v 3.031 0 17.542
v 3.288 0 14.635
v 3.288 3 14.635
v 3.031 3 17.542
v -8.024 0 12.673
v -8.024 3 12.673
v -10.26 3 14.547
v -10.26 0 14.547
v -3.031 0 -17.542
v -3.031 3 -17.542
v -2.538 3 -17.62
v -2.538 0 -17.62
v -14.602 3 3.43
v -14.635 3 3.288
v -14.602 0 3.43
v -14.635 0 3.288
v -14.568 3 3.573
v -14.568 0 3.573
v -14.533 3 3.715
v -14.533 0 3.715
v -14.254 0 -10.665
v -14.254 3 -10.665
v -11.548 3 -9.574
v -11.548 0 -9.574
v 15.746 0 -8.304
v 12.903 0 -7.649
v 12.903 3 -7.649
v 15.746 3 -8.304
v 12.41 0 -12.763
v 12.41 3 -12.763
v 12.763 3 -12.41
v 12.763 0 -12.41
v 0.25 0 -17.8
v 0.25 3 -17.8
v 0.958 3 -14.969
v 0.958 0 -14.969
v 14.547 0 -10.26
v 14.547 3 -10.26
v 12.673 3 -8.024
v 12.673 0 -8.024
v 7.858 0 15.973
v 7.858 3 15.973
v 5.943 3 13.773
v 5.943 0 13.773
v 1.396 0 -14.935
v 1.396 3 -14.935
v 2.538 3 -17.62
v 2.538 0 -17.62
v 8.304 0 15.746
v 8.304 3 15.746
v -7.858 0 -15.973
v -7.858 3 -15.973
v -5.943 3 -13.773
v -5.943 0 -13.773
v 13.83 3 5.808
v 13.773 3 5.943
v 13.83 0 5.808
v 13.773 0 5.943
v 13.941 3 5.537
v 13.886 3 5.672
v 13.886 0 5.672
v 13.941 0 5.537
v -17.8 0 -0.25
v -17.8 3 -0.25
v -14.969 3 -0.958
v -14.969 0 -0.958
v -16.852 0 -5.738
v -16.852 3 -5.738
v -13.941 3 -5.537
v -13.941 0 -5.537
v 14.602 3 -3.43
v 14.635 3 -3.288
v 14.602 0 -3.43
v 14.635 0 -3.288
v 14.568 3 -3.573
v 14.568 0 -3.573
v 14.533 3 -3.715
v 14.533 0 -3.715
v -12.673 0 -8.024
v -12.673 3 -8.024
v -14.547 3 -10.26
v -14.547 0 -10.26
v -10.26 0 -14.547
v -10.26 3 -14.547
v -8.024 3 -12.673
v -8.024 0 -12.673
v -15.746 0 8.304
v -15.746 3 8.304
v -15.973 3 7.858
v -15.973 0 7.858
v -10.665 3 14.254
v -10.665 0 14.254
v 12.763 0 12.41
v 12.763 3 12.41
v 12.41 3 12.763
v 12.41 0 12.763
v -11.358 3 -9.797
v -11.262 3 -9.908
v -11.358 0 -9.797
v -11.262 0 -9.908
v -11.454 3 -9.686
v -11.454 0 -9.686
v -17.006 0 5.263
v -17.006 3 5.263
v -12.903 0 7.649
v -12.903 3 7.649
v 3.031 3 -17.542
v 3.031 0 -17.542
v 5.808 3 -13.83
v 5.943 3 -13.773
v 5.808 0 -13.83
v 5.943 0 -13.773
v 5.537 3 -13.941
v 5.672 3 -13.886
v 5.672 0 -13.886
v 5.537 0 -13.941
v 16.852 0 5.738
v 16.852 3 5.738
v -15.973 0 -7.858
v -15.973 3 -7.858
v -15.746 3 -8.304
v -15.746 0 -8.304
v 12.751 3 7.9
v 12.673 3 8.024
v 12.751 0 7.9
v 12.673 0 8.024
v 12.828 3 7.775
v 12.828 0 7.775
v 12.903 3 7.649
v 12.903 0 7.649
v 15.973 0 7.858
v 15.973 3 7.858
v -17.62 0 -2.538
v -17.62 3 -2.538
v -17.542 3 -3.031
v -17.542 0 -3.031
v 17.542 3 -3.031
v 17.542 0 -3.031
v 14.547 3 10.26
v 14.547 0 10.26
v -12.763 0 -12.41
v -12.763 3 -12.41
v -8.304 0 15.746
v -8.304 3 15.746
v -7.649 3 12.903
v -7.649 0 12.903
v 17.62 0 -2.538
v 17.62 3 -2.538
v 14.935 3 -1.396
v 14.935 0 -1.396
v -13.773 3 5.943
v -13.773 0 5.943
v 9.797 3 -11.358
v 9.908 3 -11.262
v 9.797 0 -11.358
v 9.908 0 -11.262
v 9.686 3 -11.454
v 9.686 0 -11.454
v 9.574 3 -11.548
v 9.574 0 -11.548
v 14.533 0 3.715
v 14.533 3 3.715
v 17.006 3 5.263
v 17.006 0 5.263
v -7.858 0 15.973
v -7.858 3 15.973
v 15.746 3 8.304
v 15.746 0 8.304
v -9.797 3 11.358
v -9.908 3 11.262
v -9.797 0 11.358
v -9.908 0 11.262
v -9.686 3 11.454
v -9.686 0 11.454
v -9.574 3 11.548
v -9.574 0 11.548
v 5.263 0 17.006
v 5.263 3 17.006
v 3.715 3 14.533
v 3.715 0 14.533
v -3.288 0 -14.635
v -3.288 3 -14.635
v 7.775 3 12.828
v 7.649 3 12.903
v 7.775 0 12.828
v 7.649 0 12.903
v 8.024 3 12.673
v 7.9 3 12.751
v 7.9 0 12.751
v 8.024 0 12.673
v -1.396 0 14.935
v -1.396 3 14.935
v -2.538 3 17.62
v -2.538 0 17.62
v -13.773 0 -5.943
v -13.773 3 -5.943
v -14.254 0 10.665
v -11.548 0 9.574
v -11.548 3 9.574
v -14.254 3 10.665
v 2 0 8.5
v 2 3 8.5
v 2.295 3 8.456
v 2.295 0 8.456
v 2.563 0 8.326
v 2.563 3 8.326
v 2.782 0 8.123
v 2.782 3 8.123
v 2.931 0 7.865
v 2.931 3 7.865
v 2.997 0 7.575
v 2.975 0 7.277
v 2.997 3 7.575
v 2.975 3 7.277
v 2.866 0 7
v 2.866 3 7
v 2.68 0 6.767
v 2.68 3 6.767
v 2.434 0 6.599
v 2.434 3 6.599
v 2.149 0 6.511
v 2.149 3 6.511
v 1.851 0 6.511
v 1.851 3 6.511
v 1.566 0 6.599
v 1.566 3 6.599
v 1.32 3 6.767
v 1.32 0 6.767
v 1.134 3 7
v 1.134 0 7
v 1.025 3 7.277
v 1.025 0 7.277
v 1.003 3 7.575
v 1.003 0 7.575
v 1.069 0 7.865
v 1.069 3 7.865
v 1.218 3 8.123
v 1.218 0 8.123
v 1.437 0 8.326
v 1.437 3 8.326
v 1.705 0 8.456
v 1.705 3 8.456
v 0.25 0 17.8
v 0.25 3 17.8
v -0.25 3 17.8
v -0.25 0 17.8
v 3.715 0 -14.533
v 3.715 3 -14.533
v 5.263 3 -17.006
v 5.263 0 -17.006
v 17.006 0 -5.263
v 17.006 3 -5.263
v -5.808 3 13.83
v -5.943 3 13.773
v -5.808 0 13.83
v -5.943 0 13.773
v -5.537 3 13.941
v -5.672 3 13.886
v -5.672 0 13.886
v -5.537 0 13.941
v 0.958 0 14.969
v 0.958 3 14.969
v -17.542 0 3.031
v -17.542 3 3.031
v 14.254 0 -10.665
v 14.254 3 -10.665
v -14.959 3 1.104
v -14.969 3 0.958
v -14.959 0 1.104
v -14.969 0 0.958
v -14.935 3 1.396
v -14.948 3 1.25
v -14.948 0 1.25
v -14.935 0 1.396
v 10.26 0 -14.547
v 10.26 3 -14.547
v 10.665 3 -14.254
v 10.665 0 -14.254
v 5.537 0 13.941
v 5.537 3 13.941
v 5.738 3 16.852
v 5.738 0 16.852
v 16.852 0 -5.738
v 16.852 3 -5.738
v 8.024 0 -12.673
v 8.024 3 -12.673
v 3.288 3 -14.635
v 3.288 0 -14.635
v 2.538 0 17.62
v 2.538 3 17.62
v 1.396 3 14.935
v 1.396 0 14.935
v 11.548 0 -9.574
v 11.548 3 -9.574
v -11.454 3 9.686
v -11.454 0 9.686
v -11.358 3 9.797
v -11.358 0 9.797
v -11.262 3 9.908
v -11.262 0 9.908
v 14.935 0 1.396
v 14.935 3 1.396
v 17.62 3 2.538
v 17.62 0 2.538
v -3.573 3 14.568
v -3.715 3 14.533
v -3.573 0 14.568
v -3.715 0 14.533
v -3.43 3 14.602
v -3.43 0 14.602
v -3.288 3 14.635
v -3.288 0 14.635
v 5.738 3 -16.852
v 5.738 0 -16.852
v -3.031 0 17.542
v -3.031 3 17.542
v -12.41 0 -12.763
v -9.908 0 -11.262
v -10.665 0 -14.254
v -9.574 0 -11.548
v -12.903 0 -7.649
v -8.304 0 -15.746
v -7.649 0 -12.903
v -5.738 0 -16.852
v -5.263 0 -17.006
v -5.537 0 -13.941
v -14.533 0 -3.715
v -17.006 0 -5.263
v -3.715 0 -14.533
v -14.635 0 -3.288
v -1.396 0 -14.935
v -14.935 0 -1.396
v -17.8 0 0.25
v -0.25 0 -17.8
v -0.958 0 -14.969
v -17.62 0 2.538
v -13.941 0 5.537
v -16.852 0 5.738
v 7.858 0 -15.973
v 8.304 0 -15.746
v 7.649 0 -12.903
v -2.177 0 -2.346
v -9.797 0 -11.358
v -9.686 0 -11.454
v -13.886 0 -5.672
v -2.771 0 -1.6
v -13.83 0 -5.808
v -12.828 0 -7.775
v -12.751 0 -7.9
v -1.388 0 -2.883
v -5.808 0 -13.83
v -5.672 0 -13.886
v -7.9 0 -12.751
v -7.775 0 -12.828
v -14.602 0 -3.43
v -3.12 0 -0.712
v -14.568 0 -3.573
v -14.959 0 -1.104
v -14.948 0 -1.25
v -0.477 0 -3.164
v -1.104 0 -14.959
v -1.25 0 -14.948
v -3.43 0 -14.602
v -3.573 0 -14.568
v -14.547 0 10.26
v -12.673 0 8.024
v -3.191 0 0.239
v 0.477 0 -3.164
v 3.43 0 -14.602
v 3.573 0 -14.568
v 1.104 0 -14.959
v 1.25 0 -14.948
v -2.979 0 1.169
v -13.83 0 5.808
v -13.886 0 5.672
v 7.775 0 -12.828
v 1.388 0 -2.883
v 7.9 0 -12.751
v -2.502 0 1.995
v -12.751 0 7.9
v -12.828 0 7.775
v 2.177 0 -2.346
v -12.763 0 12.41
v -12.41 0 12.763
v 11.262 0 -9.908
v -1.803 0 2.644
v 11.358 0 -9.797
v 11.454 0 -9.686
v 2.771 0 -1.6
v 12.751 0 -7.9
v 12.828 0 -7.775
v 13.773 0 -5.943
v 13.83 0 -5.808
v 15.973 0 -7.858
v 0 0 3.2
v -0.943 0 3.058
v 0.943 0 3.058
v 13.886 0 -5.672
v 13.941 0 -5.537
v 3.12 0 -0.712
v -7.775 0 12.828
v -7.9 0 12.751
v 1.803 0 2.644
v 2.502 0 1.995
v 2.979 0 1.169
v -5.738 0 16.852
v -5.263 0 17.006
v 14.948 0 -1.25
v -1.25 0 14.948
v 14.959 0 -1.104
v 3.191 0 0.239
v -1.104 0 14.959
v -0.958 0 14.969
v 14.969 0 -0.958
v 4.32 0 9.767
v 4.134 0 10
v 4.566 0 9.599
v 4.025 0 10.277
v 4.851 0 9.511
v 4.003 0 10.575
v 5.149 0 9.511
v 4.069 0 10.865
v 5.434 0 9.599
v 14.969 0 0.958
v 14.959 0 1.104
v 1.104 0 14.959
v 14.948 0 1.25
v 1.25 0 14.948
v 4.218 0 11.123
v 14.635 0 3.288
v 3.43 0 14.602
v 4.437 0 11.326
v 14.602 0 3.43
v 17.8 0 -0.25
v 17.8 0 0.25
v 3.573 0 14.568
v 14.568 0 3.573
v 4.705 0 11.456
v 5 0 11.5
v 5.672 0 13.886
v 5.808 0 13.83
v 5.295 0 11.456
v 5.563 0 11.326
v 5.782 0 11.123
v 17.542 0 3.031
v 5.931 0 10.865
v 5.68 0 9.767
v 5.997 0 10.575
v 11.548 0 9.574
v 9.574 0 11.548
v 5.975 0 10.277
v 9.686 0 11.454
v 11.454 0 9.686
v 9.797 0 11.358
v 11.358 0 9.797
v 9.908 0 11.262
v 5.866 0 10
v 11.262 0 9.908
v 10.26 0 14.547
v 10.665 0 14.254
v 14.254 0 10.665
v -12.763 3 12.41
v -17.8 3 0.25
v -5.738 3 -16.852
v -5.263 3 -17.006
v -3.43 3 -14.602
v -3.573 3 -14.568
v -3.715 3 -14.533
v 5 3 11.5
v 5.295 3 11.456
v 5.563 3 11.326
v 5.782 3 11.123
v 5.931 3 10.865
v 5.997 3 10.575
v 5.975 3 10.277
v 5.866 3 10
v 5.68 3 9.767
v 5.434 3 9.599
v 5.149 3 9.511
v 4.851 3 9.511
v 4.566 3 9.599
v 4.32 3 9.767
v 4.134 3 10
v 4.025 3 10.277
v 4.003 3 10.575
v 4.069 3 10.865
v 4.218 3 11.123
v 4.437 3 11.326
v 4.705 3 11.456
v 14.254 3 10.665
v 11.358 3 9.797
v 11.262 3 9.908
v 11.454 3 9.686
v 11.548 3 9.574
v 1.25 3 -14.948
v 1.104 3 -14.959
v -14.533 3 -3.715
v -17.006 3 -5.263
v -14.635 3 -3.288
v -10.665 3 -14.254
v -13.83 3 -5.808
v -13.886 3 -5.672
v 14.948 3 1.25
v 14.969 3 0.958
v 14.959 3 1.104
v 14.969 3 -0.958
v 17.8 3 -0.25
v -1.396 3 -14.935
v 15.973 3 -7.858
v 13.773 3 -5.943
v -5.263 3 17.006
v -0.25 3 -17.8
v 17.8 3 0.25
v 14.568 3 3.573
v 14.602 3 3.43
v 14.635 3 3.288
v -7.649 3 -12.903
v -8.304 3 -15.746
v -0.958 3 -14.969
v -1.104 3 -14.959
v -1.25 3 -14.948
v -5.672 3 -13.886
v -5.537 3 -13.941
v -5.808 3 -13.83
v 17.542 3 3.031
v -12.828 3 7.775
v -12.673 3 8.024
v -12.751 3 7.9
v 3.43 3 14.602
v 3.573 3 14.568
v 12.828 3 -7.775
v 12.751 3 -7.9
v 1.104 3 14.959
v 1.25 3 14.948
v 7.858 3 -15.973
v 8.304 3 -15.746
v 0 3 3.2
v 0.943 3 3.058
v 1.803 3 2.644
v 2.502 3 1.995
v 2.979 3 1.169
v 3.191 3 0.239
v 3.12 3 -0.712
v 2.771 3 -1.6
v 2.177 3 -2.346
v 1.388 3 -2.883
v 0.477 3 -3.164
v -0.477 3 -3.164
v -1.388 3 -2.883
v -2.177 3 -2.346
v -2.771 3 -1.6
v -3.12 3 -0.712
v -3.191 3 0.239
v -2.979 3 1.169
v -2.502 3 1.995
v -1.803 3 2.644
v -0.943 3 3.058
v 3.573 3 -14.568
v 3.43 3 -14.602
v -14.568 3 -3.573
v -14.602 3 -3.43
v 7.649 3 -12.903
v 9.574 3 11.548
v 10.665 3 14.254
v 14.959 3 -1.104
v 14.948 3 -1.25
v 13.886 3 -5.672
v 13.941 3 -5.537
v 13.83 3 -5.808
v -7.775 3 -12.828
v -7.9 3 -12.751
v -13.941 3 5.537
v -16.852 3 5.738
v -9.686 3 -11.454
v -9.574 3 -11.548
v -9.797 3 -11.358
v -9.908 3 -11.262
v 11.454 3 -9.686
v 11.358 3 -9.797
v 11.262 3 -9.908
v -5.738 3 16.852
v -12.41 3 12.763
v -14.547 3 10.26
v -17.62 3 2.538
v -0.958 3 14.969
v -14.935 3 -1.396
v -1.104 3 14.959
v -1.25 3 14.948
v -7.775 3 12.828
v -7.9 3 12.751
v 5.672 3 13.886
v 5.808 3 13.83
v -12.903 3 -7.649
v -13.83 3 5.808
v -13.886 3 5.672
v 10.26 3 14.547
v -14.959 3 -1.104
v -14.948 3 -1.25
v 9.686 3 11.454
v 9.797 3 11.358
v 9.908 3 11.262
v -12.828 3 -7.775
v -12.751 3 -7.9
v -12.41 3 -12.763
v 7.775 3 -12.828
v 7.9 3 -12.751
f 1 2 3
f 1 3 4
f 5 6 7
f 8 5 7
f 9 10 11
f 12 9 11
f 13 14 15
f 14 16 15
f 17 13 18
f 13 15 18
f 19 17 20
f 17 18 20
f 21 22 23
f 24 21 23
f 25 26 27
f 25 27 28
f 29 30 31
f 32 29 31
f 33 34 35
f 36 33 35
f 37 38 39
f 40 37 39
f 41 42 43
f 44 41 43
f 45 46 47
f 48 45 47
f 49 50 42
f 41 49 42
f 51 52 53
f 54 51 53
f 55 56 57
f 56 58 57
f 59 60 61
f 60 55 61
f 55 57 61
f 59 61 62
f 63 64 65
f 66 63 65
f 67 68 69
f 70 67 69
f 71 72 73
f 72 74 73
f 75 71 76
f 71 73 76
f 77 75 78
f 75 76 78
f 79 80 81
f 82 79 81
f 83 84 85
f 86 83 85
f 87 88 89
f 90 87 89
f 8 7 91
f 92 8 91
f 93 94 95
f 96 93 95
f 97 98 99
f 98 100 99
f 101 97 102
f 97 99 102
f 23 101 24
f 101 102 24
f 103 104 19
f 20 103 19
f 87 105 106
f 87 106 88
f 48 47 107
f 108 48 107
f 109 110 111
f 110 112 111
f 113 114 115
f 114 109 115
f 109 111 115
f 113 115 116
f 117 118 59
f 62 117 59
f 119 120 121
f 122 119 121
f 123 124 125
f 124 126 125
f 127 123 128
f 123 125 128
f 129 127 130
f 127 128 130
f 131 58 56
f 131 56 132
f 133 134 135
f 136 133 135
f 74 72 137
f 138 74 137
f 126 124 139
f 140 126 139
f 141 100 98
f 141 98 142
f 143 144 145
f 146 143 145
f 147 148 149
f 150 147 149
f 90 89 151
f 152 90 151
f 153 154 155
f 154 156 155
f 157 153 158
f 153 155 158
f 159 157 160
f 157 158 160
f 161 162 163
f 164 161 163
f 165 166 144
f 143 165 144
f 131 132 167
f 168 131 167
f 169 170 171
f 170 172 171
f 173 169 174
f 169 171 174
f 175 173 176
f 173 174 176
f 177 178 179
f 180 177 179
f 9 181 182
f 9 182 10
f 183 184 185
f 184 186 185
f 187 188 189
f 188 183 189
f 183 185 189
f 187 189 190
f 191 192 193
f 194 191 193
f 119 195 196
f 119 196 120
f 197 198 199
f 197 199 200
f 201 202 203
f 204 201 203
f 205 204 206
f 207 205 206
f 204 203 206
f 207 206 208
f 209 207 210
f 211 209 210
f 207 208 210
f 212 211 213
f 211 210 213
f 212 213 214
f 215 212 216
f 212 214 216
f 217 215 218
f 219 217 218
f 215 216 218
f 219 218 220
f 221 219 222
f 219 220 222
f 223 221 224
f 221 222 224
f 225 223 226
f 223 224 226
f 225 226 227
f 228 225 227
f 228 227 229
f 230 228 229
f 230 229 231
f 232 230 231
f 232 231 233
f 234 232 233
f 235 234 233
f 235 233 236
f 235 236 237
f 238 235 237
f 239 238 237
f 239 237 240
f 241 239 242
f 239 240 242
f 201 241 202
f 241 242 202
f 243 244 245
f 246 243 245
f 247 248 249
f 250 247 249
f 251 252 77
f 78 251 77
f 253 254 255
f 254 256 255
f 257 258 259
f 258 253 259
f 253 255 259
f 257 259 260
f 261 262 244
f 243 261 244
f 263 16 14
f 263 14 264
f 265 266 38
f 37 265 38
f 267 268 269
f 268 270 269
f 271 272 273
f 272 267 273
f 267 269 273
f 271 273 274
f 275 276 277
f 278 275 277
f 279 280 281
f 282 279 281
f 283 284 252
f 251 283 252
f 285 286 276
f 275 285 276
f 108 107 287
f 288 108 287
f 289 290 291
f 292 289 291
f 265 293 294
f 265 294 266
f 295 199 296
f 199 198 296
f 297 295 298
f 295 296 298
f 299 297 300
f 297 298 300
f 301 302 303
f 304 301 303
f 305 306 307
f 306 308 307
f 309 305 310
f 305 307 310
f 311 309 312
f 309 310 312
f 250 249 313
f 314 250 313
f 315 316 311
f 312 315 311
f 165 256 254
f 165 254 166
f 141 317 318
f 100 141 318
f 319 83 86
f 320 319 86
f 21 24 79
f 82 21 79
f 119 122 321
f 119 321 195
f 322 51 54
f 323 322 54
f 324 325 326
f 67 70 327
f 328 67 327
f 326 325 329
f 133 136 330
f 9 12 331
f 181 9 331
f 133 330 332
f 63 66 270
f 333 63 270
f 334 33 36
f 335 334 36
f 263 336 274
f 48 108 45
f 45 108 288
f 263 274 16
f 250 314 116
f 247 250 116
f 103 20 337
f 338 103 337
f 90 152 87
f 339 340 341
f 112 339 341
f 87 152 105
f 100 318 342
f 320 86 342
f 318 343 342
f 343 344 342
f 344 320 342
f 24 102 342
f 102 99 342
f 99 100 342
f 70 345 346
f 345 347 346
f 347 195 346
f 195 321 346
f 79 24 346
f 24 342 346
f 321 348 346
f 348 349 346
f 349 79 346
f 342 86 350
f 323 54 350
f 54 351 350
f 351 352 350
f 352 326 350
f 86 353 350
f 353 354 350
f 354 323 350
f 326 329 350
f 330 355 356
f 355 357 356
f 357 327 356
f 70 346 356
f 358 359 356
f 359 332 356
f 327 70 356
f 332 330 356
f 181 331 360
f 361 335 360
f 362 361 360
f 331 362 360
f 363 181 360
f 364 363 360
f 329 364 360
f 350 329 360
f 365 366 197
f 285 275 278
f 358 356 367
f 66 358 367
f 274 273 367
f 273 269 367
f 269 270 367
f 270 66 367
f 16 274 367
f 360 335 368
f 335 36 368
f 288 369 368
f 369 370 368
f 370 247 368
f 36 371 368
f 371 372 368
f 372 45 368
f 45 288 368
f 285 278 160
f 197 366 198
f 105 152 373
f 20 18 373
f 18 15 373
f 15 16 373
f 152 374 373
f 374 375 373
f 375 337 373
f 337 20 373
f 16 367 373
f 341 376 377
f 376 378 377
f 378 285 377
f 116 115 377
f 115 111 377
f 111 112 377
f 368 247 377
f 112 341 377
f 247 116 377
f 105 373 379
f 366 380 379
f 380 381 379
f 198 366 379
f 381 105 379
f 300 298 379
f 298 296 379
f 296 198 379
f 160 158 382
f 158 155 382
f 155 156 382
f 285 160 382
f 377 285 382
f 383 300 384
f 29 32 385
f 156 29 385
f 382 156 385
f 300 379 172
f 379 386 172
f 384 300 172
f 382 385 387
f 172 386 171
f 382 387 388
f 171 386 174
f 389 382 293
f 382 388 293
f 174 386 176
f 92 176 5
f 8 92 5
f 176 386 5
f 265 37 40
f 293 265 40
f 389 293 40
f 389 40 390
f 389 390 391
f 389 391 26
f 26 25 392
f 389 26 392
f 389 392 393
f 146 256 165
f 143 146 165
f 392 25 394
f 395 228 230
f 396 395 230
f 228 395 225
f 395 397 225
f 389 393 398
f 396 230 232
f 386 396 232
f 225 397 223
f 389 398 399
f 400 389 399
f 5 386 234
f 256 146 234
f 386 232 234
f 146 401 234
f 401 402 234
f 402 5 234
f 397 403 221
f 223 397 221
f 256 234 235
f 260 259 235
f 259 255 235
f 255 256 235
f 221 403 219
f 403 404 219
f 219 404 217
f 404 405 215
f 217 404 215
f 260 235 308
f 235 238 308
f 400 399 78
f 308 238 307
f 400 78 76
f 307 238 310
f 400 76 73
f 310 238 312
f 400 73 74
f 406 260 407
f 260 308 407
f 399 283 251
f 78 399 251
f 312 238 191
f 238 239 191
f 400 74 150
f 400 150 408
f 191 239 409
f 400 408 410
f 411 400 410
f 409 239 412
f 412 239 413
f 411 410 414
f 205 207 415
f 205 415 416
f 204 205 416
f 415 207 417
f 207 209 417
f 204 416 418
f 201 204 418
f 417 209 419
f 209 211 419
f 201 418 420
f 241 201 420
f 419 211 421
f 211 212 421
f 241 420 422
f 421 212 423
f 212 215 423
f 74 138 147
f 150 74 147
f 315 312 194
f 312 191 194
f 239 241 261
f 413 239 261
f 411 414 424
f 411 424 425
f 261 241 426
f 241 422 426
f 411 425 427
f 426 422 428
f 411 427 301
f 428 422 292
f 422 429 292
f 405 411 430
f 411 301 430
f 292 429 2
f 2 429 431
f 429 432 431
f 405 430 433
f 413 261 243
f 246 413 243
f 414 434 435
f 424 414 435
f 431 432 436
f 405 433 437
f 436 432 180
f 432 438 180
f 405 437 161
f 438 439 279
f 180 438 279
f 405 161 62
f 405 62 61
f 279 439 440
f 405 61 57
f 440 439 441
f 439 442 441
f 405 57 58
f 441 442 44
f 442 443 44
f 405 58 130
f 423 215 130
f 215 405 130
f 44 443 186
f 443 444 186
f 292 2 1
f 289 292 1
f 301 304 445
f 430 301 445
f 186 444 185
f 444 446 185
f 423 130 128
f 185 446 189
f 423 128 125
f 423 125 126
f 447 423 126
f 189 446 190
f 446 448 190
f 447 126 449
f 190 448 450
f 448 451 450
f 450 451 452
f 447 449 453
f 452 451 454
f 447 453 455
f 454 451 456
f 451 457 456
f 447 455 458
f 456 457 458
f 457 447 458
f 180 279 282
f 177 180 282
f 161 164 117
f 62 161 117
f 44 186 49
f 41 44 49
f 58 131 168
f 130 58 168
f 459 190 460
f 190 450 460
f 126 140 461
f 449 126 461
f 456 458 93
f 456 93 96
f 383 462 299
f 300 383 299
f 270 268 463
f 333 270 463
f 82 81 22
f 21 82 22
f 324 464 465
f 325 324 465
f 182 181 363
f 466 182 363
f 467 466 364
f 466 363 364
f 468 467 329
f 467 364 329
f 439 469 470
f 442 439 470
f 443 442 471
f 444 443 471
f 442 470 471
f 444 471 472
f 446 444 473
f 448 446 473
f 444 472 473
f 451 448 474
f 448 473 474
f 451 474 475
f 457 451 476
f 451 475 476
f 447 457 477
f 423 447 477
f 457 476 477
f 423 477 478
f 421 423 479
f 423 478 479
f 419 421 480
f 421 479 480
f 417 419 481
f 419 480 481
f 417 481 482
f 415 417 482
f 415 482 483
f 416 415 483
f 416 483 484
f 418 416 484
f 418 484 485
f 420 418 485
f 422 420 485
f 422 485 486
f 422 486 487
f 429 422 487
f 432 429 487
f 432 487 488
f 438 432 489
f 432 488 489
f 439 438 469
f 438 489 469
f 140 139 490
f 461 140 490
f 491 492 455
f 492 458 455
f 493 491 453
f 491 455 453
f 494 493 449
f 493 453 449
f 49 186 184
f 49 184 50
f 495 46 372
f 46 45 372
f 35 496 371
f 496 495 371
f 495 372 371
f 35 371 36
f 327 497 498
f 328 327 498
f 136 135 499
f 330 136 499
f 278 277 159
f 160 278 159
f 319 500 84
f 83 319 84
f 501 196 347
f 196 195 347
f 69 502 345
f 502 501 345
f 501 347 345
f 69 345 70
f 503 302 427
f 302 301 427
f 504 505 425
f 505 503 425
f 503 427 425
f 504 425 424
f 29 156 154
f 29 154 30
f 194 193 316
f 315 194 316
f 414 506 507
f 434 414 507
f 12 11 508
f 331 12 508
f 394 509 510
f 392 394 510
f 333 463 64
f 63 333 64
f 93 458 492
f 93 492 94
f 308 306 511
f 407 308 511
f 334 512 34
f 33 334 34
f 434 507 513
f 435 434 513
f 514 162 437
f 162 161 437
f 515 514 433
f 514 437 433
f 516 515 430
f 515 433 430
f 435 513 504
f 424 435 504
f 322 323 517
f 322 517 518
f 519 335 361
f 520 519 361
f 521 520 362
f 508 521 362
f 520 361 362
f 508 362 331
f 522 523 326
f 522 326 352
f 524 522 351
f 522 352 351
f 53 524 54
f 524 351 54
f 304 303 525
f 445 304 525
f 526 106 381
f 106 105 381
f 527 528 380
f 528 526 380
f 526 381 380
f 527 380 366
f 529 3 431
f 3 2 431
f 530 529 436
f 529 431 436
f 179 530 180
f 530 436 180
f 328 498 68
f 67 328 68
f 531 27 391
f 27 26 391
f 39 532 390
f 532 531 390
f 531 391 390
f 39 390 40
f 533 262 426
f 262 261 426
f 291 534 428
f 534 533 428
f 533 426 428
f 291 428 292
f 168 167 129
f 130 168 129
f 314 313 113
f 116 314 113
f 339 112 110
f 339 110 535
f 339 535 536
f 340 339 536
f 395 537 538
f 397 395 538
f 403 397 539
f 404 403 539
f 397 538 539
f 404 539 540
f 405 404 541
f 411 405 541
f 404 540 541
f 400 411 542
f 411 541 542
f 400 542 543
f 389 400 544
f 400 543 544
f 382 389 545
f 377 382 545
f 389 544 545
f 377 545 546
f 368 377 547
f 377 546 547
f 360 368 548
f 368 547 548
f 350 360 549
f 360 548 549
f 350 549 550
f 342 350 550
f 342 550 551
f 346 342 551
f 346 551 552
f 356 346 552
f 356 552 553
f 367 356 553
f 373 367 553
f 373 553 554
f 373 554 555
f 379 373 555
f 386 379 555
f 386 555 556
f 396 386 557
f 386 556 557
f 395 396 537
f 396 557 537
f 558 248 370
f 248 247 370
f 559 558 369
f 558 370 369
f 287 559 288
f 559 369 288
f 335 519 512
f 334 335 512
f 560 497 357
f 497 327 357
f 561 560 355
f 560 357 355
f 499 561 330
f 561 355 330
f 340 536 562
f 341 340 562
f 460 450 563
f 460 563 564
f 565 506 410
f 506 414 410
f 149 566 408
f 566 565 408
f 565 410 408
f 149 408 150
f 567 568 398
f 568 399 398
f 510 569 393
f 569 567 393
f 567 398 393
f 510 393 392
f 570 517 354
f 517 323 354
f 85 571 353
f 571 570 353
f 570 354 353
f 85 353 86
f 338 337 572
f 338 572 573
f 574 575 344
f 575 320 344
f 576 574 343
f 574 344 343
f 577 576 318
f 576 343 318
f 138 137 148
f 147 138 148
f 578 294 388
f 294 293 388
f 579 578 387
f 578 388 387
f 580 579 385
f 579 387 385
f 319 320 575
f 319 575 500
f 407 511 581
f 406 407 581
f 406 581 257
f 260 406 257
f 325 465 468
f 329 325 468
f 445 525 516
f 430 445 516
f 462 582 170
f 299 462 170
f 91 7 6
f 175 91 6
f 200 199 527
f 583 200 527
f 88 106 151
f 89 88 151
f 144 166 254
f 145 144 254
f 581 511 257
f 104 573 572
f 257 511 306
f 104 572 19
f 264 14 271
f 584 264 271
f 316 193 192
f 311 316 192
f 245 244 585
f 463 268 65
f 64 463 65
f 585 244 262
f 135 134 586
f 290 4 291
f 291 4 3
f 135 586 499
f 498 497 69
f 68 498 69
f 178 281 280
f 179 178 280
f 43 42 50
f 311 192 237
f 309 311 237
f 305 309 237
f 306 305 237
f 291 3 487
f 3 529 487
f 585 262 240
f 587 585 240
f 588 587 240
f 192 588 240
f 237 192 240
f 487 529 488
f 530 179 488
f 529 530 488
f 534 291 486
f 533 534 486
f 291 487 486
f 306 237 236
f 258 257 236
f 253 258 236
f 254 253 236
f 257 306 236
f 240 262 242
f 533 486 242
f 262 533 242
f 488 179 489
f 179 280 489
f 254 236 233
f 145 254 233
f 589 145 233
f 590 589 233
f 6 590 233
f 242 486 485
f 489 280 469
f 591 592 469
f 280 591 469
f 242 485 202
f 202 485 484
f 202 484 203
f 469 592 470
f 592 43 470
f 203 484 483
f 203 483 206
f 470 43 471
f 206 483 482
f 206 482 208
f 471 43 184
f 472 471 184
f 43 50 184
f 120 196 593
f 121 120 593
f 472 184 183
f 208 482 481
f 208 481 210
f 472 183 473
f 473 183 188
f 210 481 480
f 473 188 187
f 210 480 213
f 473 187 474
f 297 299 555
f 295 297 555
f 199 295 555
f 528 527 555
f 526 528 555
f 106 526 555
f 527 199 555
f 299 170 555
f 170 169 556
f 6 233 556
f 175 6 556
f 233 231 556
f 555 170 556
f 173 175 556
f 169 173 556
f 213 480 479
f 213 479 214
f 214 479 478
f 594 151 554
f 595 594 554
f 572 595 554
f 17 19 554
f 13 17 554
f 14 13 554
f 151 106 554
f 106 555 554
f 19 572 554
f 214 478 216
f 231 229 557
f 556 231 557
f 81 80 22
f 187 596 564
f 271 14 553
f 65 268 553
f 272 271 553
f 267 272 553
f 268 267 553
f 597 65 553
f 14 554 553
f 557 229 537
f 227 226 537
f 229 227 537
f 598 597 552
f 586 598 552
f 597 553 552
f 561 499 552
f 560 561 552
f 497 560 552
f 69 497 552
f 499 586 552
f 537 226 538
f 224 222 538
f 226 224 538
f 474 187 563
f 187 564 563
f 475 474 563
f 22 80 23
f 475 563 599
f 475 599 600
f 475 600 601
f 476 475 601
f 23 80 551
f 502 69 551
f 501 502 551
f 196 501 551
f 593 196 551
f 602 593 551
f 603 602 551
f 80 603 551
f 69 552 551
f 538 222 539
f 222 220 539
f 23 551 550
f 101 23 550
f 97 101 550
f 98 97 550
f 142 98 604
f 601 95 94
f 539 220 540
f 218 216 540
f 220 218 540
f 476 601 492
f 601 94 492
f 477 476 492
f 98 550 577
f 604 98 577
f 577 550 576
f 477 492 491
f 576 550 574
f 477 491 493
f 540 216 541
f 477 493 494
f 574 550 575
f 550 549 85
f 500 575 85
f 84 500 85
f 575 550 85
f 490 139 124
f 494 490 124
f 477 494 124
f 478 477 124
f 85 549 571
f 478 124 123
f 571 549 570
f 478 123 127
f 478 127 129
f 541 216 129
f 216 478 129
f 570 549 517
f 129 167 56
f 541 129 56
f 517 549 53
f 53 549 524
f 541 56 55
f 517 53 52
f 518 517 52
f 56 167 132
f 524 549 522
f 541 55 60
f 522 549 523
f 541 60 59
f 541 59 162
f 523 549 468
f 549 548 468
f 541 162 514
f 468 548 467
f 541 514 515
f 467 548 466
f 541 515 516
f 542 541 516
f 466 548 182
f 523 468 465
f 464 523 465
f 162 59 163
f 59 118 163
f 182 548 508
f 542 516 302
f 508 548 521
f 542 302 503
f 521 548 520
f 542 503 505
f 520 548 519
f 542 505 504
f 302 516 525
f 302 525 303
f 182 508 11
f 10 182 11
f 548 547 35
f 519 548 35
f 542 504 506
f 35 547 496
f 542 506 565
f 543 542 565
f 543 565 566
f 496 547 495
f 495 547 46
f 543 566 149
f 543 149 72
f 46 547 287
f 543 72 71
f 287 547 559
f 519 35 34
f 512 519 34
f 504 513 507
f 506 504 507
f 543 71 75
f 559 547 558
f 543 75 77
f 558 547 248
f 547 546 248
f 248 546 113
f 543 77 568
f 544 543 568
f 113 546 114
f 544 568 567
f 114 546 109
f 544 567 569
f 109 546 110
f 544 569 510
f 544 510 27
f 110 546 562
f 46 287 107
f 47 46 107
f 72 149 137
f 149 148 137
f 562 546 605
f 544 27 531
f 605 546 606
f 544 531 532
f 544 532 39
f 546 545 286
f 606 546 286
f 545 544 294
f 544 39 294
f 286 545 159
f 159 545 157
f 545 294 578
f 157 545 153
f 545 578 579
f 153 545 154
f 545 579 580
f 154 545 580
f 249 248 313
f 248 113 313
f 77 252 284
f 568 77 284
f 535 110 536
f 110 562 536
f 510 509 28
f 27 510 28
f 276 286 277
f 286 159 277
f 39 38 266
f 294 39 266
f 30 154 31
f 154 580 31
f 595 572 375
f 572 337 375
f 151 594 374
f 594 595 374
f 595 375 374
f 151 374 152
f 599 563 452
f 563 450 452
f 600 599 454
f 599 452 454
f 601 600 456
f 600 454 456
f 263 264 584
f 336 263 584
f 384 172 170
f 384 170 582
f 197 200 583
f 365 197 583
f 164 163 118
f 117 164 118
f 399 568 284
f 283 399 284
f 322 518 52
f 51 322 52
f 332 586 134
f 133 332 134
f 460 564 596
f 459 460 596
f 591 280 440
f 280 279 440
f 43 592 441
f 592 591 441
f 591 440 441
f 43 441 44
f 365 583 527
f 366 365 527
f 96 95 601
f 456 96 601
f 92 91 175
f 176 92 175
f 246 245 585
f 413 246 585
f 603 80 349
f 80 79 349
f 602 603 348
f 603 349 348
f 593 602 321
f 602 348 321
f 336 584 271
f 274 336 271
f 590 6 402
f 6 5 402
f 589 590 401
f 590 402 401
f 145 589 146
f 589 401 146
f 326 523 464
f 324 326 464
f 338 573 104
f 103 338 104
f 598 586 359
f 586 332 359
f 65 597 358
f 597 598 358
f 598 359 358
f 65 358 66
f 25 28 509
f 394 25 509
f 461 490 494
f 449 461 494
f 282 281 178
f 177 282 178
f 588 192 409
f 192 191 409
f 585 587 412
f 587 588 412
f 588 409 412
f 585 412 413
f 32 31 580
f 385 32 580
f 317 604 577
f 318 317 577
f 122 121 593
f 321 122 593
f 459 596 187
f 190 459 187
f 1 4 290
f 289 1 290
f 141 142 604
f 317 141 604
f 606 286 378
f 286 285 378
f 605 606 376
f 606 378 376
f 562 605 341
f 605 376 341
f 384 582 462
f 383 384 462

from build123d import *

# Parameters (mm, degrees)
SKETCH1_R           = 15
BOSS_EXTRUDE1_DEPTH = 3
BOSS_EXTRUDE2_DEPTH = 3
CIRPATTERN1_COUNT   = 40
SKETCH4_R           = 3.2
CUT_EXTRUDE1_DEPTH  = 3
SKETCH5_R           = 1
CUT_EXTRUDE2_DEPTH  = 3


with BuildPart() as part:
    # Sketch1 → Boss-Extrude1 (new body)
    with BuildSketch(Plane(origin=(0, 0, 0), x_dir=(1, 0, 0), z_dir=(0, 1, 0))):
        with Locations(Location((0, 0, 0), (0, 0, 270))):
            Circle(SKETCH1_R)
    extrude(amount=BOSS_EXTRUDE1_DEPTH)

    # Sketch3 → Boss-Extrude2 (add)
    with BuildSketch(Plane(origin=(0, 3, 0), x_dir=(1, 0, 0), z_dir=(0, 1, 0))):
        Polygon((-1, 14.8), (-0.25, 17.8), (0.25, 17.8), (1, 14.8), align=None)
    boss_extrude2 = extrude(amount=-BOSS_EXTRUDE2_DEPTH)

    # CirPattern1: Boss-Extrude2 ×40 about axis
    cirpattern1_axis = Axis((0, 0, 0), (0, 1, 0))
    for i in range(1, CIRPATTERN1_COUNT):
        add(boss_extrude2.rotate(cirpattern1_axis, i * 360 / CIRPATTERN1_COUNT))

    # Sketch4 → Cut-Extrude1 (cut)
    with BuildSketch(Plane(origin=(0, 3, 0), x_dir=(1, 0, 0), z_dir=(0, 1, 0))):
        with Locations(Location((0, 0, 0), (0, 0, 270))):
            Circle(SKETCH4_R)
    extrude(amount=-CUT_EXTRUDE1_DEPTH, mode=Mode.SUBTRACT)

    # Sketch5 → Cut-Extrude2 (cut)
    with BuildSketch(Plane(origin=(0, 3, 0), x_dir=(1, 0, 0), z_dir=(0, 1, 0))):
        with Locations(Location((2, -7.5, 0), (0, 0, 270))):
            Circle(SKETCH5_R)
        with Locations(Location((5, -10.5, 0), (0, 0, 270))):
            Circle(SKETCH5_R)
    extrude(amount=-CUT_EXTRUDE2_DEPTH, mode=Mode.SUBTRACT)


solid = part.part
